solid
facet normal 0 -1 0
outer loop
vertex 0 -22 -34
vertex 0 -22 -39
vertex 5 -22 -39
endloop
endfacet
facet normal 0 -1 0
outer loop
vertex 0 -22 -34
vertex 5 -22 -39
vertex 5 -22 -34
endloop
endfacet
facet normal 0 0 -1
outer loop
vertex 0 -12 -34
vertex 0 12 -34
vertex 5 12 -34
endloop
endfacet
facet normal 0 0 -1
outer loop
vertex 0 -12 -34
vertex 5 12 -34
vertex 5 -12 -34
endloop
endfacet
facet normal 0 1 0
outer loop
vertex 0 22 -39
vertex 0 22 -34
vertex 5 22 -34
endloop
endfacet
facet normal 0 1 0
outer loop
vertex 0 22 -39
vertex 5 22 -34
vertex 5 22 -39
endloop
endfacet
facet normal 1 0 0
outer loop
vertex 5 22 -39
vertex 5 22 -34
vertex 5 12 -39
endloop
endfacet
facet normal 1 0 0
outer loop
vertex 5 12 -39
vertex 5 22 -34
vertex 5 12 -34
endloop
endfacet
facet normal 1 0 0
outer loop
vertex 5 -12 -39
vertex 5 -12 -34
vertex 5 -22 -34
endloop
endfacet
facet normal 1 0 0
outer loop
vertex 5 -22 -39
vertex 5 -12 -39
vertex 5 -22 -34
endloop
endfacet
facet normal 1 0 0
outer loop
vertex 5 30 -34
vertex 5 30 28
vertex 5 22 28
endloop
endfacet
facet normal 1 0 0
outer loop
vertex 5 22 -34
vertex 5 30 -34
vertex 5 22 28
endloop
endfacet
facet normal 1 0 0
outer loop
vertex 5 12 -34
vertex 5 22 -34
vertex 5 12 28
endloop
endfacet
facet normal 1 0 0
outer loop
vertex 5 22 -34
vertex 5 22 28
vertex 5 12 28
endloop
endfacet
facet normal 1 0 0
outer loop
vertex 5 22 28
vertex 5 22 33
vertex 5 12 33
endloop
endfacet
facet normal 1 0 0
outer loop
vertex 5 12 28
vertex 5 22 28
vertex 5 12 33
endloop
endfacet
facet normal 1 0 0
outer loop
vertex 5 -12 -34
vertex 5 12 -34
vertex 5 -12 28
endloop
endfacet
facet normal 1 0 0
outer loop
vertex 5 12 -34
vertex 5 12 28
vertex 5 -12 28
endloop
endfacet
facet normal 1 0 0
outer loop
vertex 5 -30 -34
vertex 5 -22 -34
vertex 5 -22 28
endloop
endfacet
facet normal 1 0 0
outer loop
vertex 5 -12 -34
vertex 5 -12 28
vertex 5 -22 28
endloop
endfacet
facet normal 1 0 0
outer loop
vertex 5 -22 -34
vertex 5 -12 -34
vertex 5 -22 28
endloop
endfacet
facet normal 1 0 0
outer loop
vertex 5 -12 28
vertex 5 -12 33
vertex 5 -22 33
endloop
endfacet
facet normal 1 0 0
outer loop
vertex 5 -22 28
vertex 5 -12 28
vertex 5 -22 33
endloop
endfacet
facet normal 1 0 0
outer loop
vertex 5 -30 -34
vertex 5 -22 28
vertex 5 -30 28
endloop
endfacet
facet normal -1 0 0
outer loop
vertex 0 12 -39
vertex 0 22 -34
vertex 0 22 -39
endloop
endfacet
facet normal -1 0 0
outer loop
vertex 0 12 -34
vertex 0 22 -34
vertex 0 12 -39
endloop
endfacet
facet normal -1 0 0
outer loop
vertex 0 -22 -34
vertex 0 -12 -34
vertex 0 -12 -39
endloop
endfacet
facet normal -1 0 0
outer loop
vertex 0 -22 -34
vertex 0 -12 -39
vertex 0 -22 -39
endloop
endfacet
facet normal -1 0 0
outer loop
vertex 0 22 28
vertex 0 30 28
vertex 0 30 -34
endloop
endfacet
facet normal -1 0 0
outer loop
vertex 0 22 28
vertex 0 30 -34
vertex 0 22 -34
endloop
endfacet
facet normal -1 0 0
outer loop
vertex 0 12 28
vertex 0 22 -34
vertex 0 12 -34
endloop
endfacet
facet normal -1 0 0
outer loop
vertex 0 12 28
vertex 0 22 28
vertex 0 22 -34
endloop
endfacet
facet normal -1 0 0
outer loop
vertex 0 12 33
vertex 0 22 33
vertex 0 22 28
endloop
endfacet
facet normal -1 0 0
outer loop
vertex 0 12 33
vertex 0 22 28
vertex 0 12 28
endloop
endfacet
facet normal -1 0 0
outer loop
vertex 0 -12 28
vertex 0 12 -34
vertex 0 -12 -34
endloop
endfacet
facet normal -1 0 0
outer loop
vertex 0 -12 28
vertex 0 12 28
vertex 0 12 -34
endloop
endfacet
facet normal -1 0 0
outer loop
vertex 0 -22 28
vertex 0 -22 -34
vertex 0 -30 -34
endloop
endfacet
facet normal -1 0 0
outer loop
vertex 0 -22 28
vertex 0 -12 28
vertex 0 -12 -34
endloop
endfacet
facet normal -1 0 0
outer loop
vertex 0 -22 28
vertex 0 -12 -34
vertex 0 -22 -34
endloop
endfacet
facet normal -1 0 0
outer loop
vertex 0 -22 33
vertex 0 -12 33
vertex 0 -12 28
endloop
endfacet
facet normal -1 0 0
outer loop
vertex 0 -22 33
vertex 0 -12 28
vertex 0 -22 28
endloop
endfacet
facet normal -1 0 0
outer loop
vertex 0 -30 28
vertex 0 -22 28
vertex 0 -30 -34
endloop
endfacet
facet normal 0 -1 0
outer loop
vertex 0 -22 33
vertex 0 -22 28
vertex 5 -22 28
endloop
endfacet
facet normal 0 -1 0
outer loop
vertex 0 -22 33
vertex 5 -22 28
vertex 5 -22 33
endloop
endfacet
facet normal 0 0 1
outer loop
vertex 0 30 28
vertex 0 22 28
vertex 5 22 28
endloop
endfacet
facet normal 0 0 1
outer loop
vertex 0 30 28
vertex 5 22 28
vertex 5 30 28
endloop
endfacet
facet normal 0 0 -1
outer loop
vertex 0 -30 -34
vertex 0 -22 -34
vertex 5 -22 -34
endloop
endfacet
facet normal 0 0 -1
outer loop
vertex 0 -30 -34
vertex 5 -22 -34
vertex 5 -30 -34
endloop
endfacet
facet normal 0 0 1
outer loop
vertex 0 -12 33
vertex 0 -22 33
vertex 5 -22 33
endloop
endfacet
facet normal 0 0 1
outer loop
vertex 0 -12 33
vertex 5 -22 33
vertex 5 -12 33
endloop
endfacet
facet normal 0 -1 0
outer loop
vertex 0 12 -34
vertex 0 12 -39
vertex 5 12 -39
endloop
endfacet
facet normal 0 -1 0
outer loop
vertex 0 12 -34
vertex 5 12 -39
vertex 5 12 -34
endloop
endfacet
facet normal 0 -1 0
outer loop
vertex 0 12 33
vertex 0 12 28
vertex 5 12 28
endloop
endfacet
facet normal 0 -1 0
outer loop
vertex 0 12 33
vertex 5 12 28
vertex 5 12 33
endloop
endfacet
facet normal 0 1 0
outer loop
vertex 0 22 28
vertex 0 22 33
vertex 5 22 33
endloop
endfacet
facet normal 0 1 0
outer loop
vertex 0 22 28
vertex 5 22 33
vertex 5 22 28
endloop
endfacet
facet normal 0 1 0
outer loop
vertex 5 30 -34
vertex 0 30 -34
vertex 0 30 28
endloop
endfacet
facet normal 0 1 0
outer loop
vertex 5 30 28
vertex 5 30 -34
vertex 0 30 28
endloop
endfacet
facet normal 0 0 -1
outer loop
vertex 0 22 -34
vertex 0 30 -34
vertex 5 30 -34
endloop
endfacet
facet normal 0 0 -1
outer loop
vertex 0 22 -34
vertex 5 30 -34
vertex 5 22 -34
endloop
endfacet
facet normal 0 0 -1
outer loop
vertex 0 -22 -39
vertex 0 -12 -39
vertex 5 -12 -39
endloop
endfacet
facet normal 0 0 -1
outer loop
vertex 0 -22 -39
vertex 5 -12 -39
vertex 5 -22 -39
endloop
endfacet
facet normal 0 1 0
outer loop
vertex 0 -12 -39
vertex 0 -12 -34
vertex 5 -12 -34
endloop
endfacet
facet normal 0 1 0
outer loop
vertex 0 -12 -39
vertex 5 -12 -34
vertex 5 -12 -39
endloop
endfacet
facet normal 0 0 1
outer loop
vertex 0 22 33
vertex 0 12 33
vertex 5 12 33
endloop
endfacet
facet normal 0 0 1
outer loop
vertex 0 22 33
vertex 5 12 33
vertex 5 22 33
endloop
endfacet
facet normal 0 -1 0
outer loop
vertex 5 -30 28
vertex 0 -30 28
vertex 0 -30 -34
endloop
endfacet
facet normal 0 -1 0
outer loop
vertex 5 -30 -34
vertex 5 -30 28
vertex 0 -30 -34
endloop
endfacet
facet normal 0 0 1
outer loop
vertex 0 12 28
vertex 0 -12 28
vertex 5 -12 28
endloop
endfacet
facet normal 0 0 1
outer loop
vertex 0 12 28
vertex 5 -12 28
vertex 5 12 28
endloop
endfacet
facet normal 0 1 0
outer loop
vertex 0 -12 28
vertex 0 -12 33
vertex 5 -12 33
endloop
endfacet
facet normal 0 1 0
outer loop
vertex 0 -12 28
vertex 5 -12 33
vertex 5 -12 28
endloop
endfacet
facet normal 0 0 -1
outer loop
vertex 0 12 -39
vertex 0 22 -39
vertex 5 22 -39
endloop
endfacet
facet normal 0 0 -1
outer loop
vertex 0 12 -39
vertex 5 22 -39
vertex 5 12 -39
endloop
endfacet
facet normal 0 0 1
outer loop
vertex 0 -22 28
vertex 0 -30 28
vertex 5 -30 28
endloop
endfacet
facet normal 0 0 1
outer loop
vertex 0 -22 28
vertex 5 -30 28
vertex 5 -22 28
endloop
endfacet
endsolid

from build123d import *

# Parameters (mm, degrees)
BOSS_EXTRUDE1_DEPTH = 5


with BuildPart() as part:
    # Sketch1 → Boss-Extrude1 (new body)
    with BuildSketch(Plane.YZ):
        Polygon((-30, -28), (-30, 28), (-22, 28), (-22, 33), (-12, 33), (-12, 28), (12, 28), (12, 33), (22, 33), (22, 28), (30, 28), (30, -28), (30, -34), (22, -34), (22, -39), (12, -39), (12, -34), (-12, -34), (-12, -39), (-22, -39), (-22, -34), (-30, -34), align=None)
    extrude(amount=BOSS_EXTRUDE1_DEPTH)


solid = part.part
